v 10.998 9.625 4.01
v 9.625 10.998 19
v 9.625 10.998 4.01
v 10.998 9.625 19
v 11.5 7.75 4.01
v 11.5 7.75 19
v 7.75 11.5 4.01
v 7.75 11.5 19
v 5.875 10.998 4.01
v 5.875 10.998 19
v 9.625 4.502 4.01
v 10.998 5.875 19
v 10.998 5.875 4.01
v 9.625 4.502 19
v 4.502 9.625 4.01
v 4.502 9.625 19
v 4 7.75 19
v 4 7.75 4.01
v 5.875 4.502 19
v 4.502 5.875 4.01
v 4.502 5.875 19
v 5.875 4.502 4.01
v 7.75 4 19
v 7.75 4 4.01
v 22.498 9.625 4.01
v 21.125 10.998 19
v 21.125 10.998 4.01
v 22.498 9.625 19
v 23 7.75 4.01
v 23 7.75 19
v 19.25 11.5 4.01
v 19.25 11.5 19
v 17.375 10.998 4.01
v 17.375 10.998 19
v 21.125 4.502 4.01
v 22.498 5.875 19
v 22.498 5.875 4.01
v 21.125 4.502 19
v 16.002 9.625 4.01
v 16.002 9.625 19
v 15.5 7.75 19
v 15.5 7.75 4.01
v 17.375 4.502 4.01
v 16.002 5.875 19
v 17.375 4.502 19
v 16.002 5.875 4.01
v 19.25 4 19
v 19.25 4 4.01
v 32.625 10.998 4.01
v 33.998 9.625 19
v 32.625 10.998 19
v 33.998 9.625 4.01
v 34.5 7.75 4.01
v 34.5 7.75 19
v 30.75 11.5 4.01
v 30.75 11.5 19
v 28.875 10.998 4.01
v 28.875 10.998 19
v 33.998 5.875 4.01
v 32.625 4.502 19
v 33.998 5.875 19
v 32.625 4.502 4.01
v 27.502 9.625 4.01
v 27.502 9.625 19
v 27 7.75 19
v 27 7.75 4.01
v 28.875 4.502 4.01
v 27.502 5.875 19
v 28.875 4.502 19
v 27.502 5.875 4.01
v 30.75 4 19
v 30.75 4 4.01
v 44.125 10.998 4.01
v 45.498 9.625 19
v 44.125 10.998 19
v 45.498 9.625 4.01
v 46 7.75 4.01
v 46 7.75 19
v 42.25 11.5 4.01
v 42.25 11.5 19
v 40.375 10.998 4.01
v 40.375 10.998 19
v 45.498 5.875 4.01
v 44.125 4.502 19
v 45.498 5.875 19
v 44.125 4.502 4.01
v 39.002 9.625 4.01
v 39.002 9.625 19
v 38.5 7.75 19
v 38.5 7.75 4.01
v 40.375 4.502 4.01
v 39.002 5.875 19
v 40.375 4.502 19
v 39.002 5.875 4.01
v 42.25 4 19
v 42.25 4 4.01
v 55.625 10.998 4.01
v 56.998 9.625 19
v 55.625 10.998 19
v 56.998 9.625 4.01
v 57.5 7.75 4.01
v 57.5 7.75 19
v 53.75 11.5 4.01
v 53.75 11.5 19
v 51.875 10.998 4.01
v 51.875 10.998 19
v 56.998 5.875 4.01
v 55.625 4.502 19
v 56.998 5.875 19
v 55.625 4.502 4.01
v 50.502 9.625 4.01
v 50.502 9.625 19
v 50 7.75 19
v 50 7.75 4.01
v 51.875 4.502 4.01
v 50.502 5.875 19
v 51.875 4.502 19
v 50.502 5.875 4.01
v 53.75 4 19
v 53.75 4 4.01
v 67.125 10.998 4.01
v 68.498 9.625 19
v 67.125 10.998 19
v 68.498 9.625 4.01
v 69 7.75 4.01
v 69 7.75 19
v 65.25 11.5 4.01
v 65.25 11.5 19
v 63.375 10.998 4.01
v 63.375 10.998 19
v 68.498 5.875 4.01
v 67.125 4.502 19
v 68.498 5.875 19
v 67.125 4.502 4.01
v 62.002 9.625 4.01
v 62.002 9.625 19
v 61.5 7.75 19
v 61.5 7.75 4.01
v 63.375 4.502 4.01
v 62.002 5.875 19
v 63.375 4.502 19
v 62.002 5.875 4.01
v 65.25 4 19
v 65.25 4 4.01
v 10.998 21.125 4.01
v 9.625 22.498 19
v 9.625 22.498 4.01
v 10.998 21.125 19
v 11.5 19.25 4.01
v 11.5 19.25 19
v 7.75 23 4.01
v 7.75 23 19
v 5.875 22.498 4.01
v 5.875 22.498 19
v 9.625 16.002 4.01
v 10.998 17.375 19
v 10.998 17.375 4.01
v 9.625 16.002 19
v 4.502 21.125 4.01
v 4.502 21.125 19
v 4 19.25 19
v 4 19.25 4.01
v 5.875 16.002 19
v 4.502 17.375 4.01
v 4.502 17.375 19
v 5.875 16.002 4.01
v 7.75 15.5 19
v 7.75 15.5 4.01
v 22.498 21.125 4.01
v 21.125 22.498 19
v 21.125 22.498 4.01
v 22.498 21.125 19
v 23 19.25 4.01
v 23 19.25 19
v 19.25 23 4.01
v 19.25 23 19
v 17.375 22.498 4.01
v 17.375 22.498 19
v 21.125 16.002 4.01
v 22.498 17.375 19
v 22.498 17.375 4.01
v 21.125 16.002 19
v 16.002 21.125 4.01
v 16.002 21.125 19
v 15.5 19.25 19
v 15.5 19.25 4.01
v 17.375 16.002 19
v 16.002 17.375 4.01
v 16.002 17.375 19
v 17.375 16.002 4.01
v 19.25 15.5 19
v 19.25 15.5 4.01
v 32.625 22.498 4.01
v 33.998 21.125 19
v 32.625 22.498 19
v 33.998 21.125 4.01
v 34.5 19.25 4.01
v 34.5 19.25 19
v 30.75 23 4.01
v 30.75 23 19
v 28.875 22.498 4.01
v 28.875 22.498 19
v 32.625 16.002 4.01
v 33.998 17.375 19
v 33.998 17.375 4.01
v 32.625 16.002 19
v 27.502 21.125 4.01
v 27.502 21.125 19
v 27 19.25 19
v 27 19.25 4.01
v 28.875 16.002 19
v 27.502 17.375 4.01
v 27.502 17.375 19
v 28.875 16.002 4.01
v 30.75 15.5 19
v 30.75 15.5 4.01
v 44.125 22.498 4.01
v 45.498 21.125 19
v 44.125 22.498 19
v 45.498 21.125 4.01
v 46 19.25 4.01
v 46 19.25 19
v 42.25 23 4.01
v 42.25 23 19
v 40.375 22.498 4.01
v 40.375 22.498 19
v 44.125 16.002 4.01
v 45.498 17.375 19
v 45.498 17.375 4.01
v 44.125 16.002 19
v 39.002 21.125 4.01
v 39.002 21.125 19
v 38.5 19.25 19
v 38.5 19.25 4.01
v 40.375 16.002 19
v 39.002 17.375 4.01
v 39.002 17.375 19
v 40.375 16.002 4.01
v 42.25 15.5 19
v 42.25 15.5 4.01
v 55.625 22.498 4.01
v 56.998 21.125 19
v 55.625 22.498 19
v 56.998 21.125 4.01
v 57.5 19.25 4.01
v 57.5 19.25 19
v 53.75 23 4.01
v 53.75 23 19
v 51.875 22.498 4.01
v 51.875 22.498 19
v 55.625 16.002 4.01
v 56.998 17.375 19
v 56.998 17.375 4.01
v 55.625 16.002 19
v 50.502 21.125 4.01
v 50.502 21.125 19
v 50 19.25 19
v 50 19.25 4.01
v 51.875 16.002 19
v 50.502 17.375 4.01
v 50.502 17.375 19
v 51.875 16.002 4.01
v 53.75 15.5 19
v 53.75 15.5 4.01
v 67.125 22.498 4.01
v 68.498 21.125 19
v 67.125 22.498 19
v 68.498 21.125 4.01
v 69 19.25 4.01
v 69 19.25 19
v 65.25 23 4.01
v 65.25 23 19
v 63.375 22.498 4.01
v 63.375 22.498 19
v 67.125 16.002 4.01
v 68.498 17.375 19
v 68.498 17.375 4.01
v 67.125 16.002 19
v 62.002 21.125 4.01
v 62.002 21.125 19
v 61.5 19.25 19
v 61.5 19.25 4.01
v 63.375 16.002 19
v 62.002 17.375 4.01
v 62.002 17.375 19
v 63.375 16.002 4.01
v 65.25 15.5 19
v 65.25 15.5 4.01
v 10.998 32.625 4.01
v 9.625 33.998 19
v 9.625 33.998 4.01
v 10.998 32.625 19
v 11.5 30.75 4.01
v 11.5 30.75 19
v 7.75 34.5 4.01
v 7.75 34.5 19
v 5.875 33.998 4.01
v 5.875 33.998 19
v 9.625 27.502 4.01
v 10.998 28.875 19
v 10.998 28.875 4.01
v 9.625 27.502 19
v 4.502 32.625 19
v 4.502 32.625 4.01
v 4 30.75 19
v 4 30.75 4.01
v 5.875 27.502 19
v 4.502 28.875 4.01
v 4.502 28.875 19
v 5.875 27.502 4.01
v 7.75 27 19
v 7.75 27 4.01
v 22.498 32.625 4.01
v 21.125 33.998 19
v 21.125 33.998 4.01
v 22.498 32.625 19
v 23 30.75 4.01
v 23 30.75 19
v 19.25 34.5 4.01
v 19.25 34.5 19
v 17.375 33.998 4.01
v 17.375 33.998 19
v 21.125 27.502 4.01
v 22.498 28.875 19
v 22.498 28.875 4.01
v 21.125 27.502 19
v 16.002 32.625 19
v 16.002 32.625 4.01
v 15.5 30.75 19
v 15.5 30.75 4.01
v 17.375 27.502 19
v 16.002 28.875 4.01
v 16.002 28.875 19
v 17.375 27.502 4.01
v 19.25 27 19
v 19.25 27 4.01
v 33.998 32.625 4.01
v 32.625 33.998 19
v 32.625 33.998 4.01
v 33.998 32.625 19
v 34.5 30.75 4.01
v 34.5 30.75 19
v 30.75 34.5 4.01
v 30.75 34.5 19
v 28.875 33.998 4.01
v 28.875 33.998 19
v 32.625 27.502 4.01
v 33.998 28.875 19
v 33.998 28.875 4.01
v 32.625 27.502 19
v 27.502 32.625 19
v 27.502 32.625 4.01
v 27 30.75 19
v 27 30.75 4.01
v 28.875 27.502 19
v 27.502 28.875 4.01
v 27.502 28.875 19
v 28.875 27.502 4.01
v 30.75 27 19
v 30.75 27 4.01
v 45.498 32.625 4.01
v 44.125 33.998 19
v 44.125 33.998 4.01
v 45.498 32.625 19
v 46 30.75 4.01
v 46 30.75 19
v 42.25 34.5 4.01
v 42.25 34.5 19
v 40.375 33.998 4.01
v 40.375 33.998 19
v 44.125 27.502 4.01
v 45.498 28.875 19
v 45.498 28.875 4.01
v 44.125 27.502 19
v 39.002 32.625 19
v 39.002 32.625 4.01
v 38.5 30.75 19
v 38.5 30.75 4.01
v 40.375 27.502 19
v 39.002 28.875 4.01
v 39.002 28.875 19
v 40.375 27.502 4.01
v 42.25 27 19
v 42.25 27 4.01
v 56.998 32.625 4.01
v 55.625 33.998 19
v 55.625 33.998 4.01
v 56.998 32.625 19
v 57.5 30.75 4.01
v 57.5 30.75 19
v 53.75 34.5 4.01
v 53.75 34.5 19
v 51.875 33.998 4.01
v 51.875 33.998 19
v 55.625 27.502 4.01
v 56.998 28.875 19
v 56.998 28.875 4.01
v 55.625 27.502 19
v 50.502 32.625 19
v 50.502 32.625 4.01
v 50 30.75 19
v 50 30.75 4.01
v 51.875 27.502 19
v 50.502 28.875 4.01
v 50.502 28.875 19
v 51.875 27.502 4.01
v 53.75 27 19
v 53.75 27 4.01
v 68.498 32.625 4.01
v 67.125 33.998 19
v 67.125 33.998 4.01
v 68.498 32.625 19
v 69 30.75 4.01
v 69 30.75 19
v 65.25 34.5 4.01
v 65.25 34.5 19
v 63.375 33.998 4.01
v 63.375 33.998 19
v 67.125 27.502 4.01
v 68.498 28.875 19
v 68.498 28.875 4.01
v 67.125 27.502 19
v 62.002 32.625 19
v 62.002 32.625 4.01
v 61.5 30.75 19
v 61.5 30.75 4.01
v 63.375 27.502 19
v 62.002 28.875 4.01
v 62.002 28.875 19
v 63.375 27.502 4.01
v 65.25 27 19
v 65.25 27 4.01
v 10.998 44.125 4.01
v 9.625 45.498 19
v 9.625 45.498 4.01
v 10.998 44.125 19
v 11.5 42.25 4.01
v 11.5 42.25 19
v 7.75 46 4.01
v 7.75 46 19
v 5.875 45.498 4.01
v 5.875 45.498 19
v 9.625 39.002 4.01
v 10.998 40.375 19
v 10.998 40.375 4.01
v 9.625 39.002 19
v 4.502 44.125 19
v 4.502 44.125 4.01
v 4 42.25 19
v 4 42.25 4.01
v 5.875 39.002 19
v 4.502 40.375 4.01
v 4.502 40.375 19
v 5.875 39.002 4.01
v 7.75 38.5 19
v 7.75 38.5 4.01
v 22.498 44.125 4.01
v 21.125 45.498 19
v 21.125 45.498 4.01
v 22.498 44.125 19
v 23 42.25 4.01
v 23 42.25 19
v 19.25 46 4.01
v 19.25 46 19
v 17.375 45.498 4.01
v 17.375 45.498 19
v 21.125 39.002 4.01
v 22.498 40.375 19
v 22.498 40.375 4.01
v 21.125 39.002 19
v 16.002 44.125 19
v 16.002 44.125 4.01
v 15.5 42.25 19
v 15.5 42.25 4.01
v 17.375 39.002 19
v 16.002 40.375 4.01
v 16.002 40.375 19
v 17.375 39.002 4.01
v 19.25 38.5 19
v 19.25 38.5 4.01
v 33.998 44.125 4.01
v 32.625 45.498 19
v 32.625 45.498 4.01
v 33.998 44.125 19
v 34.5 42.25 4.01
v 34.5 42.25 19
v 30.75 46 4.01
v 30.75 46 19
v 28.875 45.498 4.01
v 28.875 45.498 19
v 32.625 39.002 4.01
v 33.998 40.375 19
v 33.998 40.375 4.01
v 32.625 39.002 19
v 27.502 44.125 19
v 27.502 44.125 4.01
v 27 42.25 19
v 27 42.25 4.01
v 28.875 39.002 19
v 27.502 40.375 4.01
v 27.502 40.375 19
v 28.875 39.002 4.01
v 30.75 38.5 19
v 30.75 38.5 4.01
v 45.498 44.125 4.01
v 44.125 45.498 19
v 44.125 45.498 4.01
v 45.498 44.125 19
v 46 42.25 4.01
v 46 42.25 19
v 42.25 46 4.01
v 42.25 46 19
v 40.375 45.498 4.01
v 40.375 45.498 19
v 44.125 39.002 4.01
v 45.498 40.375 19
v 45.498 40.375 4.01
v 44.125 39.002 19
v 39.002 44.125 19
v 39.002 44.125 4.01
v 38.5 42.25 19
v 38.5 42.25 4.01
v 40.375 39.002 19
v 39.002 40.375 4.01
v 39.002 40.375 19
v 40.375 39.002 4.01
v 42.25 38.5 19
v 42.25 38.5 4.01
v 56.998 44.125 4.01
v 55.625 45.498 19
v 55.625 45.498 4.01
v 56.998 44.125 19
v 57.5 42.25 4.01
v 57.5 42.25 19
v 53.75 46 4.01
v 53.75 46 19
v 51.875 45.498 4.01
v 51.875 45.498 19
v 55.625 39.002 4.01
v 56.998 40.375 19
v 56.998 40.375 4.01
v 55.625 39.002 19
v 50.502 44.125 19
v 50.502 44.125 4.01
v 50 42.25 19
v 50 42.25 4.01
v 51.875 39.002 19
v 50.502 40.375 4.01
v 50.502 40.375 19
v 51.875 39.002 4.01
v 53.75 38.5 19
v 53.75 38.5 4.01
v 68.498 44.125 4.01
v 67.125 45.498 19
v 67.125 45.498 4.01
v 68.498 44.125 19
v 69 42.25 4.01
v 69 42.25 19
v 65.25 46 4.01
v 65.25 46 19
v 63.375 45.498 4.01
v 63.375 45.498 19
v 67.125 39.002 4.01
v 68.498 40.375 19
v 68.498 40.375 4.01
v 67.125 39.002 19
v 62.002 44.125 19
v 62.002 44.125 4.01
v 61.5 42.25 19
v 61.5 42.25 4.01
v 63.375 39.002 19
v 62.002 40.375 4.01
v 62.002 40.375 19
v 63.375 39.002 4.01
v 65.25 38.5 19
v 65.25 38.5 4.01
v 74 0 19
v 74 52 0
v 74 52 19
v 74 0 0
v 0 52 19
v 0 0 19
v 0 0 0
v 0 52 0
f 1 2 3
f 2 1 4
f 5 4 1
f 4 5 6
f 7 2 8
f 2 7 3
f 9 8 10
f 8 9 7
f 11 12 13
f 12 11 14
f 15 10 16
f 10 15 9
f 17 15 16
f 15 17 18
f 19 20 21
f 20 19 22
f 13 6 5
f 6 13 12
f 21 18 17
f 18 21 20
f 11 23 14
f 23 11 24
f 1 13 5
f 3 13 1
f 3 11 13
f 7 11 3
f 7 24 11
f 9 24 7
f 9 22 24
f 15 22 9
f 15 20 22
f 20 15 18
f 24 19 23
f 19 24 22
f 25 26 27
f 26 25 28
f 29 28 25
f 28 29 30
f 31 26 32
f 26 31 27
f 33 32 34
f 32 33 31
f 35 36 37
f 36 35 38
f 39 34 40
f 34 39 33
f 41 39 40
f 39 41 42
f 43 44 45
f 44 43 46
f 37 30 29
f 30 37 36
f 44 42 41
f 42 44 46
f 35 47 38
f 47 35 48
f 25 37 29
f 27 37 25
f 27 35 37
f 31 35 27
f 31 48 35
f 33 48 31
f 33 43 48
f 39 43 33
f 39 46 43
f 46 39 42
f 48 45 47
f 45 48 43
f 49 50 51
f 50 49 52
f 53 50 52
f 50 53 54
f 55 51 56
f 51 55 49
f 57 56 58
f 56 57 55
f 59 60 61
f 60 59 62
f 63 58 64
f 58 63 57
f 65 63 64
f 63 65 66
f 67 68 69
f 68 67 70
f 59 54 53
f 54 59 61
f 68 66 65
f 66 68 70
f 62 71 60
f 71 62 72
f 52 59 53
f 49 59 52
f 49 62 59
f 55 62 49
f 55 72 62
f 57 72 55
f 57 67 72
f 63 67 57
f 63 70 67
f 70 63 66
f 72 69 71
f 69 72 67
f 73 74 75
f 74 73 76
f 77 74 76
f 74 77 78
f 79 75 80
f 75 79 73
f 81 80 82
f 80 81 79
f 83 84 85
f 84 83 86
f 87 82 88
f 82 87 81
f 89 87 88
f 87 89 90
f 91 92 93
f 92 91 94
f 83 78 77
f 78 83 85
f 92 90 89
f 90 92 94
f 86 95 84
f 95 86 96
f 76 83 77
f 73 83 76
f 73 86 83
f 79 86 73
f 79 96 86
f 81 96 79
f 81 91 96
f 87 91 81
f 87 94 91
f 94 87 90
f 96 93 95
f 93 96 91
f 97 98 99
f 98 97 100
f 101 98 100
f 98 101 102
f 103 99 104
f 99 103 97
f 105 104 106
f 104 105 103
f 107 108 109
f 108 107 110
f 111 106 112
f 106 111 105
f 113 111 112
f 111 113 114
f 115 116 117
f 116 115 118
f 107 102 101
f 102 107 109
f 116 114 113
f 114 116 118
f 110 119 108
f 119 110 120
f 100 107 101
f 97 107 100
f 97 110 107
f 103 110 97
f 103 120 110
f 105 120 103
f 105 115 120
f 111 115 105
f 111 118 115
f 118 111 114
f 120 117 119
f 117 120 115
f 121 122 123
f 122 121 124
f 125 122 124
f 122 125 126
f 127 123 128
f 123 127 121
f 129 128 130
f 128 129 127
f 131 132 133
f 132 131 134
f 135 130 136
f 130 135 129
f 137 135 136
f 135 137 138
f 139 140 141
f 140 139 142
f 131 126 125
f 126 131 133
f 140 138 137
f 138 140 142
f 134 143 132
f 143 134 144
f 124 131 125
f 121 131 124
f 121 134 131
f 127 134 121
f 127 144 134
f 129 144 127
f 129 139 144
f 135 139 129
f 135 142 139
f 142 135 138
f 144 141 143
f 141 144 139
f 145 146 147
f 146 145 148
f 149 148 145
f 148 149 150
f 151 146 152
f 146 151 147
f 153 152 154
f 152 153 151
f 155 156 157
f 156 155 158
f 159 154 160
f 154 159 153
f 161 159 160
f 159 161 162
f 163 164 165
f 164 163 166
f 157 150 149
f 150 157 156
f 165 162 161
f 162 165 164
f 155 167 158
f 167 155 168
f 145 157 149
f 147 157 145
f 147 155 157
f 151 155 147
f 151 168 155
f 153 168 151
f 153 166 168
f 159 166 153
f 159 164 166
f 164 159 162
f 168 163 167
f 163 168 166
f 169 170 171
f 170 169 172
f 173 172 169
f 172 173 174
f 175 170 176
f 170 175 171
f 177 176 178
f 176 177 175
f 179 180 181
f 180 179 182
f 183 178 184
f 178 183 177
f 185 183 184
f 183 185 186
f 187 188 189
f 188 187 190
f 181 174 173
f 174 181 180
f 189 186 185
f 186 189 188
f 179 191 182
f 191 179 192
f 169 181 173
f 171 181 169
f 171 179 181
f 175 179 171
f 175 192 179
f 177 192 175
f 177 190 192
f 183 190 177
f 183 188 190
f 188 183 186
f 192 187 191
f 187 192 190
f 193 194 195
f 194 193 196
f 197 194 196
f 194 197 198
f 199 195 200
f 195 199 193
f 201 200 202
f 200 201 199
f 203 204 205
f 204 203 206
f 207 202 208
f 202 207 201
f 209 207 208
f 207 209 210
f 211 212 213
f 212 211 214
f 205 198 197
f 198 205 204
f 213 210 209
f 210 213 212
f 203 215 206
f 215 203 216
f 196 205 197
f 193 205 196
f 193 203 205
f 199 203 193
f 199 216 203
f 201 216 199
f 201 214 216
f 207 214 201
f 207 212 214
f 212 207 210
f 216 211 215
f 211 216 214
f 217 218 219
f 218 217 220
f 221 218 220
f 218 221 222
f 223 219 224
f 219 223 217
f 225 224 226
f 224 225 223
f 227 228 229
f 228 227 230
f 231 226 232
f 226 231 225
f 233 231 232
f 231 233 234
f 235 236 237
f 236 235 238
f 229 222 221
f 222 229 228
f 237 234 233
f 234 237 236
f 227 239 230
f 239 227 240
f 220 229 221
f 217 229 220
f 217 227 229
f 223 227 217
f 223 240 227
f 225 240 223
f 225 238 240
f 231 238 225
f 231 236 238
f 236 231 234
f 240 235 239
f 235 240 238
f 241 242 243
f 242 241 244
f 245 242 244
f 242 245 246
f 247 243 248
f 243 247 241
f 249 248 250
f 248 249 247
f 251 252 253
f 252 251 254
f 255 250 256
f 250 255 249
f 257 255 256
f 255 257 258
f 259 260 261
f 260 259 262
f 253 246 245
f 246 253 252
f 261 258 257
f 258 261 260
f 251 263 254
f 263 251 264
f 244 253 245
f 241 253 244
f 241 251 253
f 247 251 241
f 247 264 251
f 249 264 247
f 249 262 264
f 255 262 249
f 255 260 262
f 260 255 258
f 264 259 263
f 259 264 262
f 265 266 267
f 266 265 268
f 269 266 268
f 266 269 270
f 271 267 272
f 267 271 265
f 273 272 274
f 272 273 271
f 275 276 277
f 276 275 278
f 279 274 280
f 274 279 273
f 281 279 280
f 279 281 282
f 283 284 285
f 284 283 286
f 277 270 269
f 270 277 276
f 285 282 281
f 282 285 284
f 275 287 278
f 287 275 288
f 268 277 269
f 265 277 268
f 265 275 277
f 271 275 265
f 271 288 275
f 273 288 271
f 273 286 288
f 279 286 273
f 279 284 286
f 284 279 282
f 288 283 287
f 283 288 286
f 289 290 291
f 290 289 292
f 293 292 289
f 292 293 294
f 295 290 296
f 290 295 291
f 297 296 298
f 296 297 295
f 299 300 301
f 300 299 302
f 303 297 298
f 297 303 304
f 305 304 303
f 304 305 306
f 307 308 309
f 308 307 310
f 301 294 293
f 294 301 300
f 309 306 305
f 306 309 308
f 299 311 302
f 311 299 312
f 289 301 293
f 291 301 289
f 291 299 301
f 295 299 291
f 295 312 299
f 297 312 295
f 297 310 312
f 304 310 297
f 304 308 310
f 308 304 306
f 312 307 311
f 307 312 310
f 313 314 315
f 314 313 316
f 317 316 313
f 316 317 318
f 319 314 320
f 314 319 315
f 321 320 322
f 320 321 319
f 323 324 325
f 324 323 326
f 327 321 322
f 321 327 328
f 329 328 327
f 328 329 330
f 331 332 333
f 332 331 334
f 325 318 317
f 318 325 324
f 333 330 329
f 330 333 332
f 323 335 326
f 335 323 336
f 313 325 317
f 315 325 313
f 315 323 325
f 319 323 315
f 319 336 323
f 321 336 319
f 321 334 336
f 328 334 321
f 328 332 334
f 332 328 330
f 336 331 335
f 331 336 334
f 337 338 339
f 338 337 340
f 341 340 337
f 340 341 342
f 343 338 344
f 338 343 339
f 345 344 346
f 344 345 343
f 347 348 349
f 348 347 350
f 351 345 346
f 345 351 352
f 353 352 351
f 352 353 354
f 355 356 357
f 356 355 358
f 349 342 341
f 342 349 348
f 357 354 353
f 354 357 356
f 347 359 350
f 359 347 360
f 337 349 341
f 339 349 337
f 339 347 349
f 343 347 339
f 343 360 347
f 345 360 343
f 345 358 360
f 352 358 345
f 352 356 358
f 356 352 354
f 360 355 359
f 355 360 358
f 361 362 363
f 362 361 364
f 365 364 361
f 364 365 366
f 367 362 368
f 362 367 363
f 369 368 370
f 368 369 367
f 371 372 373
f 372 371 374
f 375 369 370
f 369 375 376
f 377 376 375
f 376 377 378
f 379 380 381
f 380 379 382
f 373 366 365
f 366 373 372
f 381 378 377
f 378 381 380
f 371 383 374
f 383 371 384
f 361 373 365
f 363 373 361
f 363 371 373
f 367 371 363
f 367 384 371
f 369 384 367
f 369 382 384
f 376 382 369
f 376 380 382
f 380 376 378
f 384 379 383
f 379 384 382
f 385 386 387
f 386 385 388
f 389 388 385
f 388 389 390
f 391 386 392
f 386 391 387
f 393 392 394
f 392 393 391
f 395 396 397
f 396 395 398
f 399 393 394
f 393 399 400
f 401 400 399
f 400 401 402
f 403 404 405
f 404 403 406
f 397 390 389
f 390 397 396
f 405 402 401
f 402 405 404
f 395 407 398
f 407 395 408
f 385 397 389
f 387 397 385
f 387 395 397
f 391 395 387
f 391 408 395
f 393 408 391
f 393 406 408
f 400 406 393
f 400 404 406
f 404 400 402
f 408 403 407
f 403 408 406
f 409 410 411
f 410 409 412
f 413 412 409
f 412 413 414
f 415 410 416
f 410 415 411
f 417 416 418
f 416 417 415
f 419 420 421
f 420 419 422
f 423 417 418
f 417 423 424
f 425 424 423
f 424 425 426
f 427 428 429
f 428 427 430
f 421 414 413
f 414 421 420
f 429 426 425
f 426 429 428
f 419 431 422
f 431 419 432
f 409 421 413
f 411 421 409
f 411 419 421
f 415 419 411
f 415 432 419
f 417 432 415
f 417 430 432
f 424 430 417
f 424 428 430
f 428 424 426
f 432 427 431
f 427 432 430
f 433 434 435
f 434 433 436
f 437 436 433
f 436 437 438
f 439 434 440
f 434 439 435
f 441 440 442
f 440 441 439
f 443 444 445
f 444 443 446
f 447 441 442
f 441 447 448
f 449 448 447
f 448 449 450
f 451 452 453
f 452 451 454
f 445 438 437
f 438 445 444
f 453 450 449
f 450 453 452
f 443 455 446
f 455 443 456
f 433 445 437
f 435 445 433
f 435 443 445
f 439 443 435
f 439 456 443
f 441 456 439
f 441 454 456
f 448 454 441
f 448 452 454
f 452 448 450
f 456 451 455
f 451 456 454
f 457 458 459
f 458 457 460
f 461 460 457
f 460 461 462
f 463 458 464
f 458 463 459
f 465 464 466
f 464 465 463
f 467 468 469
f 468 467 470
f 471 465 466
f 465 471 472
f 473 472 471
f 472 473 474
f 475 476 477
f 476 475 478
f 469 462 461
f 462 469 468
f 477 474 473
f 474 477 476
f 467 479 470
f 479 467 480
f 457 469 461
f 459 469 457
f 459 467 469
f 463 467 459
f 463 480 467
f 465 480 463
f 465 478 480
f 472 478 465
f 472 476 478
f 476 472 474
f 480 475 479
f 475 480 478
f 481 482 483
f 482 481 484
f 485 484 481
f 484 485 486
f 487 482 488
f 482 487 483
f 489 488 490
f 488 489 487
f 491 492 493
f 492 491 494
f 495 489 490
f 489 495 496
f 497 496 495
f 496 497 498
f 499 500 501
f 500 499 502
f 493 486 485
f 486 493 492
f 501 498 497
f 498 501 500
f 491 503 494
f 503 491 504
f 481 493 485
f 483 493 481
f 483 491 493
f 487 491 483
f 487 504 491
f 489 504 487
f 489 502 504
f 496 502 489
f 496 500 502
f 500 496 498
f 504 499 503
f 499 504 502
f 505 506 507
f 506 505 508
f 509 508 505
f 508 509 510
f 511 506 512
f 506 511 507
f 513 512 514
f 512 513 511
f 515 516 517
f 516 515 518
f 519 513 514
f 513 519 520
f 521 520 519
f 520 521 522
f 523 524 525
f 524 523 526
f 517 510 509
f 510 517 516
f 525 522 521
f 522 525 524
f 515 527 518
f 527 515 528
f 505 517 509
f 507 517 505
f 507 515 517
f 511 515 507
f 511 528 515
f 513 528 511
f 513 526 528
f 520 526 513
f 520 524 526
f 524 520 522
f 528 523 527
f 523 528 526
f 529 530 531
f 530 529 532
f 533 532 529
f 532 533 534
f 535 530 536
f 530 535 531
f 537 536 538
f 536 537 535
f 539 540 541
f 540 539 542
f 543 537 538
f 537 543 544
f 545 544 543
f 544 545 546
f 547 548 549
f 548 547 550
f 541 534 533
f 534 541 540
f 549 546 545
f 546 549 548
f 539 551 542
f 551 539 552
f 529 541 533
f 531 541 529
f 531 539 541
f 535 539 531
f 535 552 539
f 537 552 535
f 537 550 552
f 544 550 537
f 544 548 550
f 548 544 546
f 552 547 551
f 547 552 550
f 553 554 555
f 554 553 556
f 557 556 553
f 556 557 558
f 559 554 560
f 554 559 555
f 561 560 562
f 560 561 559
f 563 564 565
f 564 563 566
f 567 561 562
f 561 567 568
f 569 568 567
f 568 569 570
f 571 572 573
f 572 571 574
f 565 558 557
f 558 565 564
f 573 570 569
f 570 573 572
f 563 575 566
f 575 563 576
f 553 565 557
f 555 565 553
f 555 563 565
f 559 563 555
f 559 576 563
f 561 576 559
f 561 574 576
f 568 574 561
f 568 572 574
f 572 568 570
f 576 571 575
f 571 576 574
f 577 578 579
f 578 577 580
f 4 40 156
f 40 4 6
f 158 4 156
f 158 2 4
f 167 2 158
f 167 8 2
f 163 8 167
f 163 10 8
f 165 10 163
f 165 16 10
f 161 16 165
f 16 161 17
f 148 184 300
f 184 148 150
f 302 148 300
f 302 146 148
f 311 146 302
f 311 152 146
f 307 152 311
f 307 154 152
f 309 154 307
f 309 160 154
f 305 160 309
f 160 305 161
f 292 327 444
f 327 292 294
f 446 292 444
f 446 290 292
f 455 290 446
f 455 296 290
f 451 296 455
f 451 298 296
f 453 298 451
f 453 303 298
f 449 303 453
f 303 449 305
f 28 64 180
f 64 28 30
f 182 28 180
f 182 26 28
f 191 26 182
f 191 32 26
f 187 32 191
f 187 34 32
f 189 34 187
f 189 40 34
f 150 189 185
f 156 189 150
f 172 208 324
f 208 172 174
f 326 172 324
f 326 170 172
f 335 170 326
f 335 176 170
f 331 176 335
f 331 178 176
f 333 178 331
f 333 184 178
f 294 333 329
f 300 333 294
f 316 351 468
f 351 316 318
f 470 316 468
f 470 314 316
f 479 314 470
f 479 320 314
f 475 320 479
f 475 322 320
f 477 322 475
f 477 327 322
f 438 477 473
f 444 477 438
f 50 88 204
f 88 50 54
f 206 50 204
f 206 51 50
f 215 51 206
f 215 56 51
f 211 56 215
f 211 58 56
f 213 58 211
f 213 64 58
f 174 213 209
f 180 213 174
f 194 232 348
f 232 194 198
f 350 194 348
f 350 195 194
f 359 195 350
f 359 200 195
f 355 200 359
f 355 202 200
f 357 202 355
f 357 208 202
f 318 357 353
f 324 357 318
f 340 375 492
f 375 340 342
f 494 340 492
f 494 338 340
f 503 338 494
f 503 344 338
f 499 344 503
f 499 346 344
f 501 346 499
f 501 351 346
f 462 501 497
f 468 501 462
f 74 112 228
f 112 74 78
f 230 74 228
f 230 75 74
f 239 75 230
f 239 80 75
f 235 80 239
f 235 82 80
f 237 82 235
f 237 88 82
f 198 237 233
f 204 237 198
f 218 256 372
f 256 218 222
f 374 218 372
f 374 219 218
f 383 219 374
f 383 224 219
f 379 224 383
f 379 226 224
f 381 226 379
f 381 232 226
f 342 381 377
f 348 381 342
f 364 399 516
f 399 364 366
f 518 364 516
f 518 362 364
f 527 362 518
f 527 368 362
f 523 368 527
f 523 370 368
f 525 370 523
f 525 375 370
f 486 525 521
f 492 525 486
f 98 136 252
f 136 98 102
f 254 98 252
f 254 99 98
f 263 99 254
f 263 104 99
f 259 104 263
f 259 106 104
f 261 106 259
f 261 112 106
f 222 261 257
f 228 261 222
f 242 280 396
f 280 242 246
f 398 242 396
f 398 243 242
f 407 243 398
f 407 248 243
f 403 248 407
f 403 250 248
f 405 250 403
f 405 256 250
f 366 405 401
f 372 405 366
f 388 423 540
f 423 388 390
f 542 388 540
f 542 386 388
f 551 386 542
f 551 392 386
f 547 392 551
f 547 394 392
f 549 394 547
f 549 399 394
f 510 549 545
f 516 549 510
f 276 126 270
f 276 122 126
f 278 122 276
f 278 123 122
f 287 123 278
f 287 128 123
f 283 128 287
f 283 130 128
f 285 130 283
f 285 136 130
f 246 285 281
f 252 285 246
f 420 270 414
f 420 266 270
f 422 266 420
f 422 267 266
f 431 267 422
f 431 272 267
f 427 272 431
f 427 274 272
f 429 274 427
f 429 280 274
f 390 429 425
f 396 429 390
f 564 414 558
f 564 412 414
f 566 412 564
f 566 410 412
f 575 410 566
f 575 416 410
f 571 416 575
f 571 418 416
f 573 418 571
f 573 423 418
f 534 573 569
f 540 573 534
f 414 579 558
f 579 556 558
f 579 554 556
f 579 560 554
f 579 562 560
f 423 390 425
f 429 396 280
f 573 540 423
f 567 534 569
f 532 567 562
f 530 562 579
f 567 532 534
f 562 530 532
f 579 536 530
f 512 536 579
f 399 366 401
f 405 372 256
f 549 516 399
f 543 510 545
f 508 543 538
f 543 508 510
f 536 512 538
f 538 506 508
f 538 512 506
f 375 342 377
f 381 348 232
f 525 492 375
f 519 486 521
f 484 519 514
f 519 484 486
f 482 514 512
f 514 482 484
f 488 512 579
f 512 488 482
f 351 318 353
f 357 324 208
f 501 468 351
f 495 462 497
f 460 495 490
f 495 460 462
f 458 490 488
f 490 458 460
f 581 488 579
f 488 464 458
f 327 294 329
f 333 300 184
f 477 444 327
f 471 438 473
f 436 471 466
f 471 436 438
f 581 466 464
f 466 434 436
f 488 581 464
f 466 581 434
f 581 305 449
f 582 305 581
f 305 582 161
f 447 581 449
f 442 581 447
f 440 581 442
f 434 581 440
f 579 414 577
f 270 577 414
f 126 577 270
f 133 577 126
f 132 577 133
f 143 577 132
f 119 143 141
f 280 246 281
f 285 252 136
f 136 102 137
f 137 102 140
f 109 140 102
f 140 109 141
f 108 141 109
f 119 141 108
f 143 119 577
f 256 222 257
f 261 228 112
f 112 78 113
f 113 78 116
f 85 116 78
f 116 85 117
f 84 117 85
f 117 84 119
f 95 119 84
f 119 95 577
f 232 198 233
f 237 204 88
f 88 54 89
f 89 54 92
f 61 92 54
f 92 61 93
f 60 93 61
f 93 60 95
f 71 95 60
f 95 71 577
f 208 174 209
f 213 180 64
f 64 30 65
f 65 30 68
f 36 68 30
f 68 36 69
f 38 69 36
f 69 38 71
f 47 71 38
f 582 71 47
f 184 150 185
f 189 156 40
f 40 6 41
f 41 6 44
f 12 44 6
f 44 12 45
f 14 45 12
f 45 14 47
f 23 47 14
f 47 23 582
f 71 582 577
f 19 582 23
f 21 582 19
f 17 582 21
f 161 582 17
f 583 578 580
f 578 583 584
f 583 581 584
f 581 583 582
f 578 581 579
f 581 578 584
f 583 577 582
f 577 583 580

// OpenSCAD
// file: ../common/library_line.scad
// 라이브러리, 검증된 것만 이곳에
include	<constants.scad>

module line_type_1(start, end, r1, r2) {
	r22 = is_undef(r2) ? r1 : r2;
    hull() {
        translate(start) sphere(r1, $fn = FN);
        translate(end) sphere(r22, $fn = FN);
    }

	dx = end.x - start.x;
	dy = end.y - start.y;
	dz = end.z - start.z;
	rx = dy == 0 ? 0 : atan(dz / dy);
	ry = dz == 0 ? 0 : 90 + atan(dx / dz);
	rz = dx == 0 ? 0 : atan(dy / dx);
	d = sqrt(dx * dx + dy * dy + dz * dz);
	fs = max(0.5, min(d / 32, 20));
	translate([(start.x + end.x) / 2 + max(r1, r22), (start.y + end.y) / 2 + max(r1, r22), (start.z + end.z) / 2 + max(r1, r22)])
		rotate([rx, ry, rz])
		linear_extrude(EPSILON, center = true)	text(str(d, " mm"), size = fs, halign = "center", language = "kr", font = "NanumGothic");
}
// file: ../common/utils.scad
// 유용한 것들, 검증된 것만
use <MCAD/boxes.scad>
include	<constants.scad>
include	<library.scad>

// 가장 긴 족의 2.1배
function big(v) = [
	max(v.x, v.y, v.z) * 2.1,
	max(v.x, v.y, v.z) * 2.1,
	max(v.x, v.y, v.z) * 2.1
];

// 임시
module	roundedBoxNotCenter(size = [32, 64, 8], radius = 8, sidesonly = true) {
	translate([size[0] / 2, size[1] / 2, size[2] / 2])		roundedBox(size, radius, sidesonly, $fn = FN);
}

// 라이브러리 아닌가
module windows(x, y, z, dx = 4, dy = 4, countx = 2, county = 2) {
//	echo(x, y, z, dx, dy, countx, county);
	w = (x + dx) / countx;
	h = (y + dy) / county;
	for (cw = [0:w:x - dx]) {
		for (ch = [0:h:y - dy]) {
			translate([cw, ch, -1])
				roundedBoxNotCenter([w - dx, h - z, z * 4], z / 2, true, $fn = FN);
		}
	}
}

// 벡터 회전 계산
function rotate_vector(angle, vector) = rotatez_vector(angle[2], rotatey_vector(angle[1], rotatex_vector(angle[0], vector)));
// x축 기준 회전 벡터 회전 계산
function rotatex_vector(anglex, vector) = [
	vector[0],
	-vector[2] * sin(anglex) + vector[1] * cos(anglex),
	vector[2] * cos(anglex) + vector[1] * sin(anglex)
];
// y축 기준 회전 벡터 회전 계산
function rotatey_vector(angley, vector) = [
	vector[0] * cos(angley) + vector[2] * sin(angley),
	vector[1],
	-vector[0] * sin(angley) + vector[2] * cos(angley)
];

// z축 기준 회전 벡터 회전 계산
function rotatez_vector(anglez, vector) = [
	-vector[1] * sin(anglez) + vector[0] * cos(anglez),
	vector[1] * cos(anglez) + vector[0] * sin(anglez),
	vector[2]
];

//	끝이 구인 선
module line_sphere(start, end, thickness = 1) {
    hull() {
        translate(start) sphere(thickness, $fn = FN);
        translate(end) sphere(thickness, $fn = FN);
    }
}

// 치수 표시, 라이브러리가 더 적합할 듯
// deprecated. use note_type_1 in library
module note(x, y, z, centered = false, fs, detail = false) {
	note_type_1([x, y, z], [x, y, z], centered, fs, detail);
	echo("WARNING! module note in utils.scad was DEPRECATED. USE note_type_1 in library. called by ", parent_module(1), $parent_modules);
}
module boardPattern(size = [128, 64, 4], degree = 60, stick = [THICK, THICK, 32]) {
	intersection() {
		cube([size[0], size[1], stick[1]]);
		for (dx = [-1024: stick[2]: 1024]) {
			translate([dx, -cos(degree) * stick[1], -1])	rotate([0, 0, degree])	cube([1024, stick[0], stick[1]]);
			mirror([1, 0, 0])
			translate([dx, -cos(degree) * stick[1], -1])	rotate([0, 0, degree])	cube([1024, stick[0], stick[1]]);
		}
	}
}


module samples() {
	cube([32, 16, 4]);
	note(32, 16, 4);
}
samples();
// file: ../common/library_function.scad
// 라이브러리, 검증된 것만 이곳에
use <MCAD/boxes.scad>
include	<constants.scad>

// 적정한 fn 값
function fnRound(radious) = $preview ? FN : floor(2 * PI * radious / 0.4) - floor(2 * PI * radious / 0.4) % 4;
//function fnRound(radious) = 2 * PI * radious / 0.4;

// z축 0로로
function set_z(v, z) = [v.x, v.y, z];

// 벡터 회전 계산
function rotate_vector(angle, vector) = rotatez_vector(angle[2], rotatey_vector(angle[1], rotatex_vector(angle[0], vector)));
// x축 기준 회전 벡터 회전 계산
function rotatex_vector(anglex, vector) = [
	vector[0],
	-vector[2] * sin(anglex) + vector[1] * cos(anglex),
	vector[2] * cos(anglex) + vector[1] * sin(anglex)
];
// y축 기준 회전 벡터 회전 계산
function rotatey_vector(angley, vector) = [
	vector[0] * cos(angley) + vector[2] * sin(angley),
	vector[1],
	-vector[0] * sin(angley) + vector[2] * cos(angley)
];

// z축 기준 회전 벡터 회전 계산
function rotatez_vector(anglez, vector) = [
	-vector[1] * sin(anglez) + vector[0] * cos(anglez),
	vector[1] * cos(anglez) + vector[0] * sin(anglez),
	vector[2]
];

//	숫자, 소수점 이하 몇자리
function strfix(number, count) =
	chr([for (cx = [0:
		len(search(".", str(number))) == 0
			? len(str(number)) - 1
			: (search(".", str(number))[0] + count) >= len(str(number))
				? len(str(number)) - 1
				: (search(".", str(number))[0] + count)
	]) ord(str(number)[cx])])
;

//	육면체에서 꼭지점들을 벡터로
function	vectors_from_cube(size) = [
	[0,			0,		0],
	[size.x,	0,		0],
	[size.x,	size.y,	0],
	[0,			size.y,	0],

	[0,			0,		size.z],
	[size.x,	0,		size.z],
	[size.x,	size.y,	size.z],
	[0,			size.y,	size.z]
];
// file: ../common/library_cube.scad
// 라이브러리, 검증된 것만 이곳에
include	<constants.scad>
use <library_function.scad>
use <library_text.scad>
use <library_line.scad>

//	튜브형태의 네모 박스, 사방 벽면만 있는 형태
//	size: 외경
module box_type_1(size, thick) {
	cube([size[0], thick, size[2]]);	//	앞
	translate([0, size[1] - thick, 0])	cube([size[0], thick, size[2]]);	//	뒤

	translate([0, 0, 0])	cube([thick, size[1], size[2]]);	//	왼쪽
	translate([size[0] - thick, 0, 0])	cube([thick, size[1], size[2]]);	//	오른쪽
}

module cube_type_0(size, center) {
	cube(size, center);
	note_type_2("", size, size, center);
}

// 끝에 반구가 더달린 실린더형태의 3차원 라인
// 대칭 사다리꼴, xz 평면에서 보았을 때
module cube_type_1(v, x) {
	rotate([0, -90, -90])
	linear_extrude(v.y)
	polygon([
		[0,		0],
		[0,		v.x],
		[v.z,	v.x - (v.x - x) / 2],
		[v.z,	(v.x - x) / 2],
		[0,		0]
	]);
}

// 한쪽으로만(x축 방향으로만) 늘어나는(또는 줄어드는) 사다리꼴-하나는 직각 유지, xz 평면에서 보았을 때
module cube_type_2(v, x) {
	rotate([0, -90, -90])
	linear_extrude(v.y)
	polygon([
		[0,		0],
		[0,		v.x],
		[v.z,	x],
		[v.z,	0],
		[0,		0]
	]);
	note_type_2("", v, [x, v.y, v.z]);
}

// 벡터들을 이용하여 꼭지점을 직각으로만 연결하는 육면체
module cube_type_3(vectors, radious) {
	// 아래쪽
	line_type_1(vectors[0], vectors[1], radious);
	line_type_1(vectors[1], vectors[2], radious);
	line_type_1(vectors[2], vectors[3], radious);
	line_type_1(vectors[3], vectors[0], radious);

	// 위쪽
	line_type_1(vectors[4], vectors[5], radious);
	line_type_1(vectors[5], vectors[6], radious);
	line_type_1(vectors[6], vectors[7], radious);
	line_type_1(vectors[7], vectors[4], radious);
	
	// 기둥
	line_type_1(vectors[0], vectors[4], radious);
	line_type_1(vectors[1], vectors[5], radious);
	line_type_1(vectors[2], vectors[6], radious);
	line_type_1(vectors[3], vectors[7], radious);
}

// x 축으로의 모서리의 일부 각(x축으로 평행한 모서리)을 제거한 것
module cube_type_4(v, c) {
	r = is_undef(c) ? min(v.x, v.y, v.z) / 16 : c;
	stiffen = r * sqrt(2);

	translate([0, r, 0])		cube(v - [0, r * 2, 0]);
	translate([0, 0, r])		cube(v - [0, 0, r * 2]);
	translate([0, r, 0])				rotate([45, 0, 0])	cube([v.x, stiffen, stiffen]);
	translate([0, r, v.z - r * 2])		rotate([45, 0, 0])	cube([v.x, stiffen, stiffen]);
	translate([0, v.y - r, v.z - r * 2])		rotate([45, 0, 0])	cube([v.x, stiffen, stiffen]);
	translate([0, v.y - r, 0])		rotate([45, 0, 0])	cube([v.x, stiffen, stiffen]);
}

// xy평면에 격자 모형, 45도
module cube_type_5(size, wall, distance) {
	w = is_undef(wall) ? size.z : wall;
	dx = is_undef(distance) ? w * 4 : distance;
	intersection() {
		cube(size);
		for(cx = [0: dx: size.x + size.y]) {
			translate([cx, - w * sqrt(2), 0])	rotate([0, 0, 45])	cube([w, size.y * 2, size.z]);
			translate([cx - size.y, - w * sqrt(2), 0])	rotate([0, 0, -45])	cube([w, size.y * 2, size.z]);
		}
	}
}

// xy평면에 격자 모형, 45도
module cube_type_5(size, wall, distance) {
	w = is_undef(wall) ? size.z : wall;
	dx = is_undef(distance) ? w * 4 : distance;
	intersection() {
		cube(size);
		for(cx = [0: dx: size.x + size.y]) {
			translate([cx, - w * sqrt(2), 0])	rotate([0, 0, 45])	cube([w, size.y * 2, size.z]);
			translate([cx - size.y, - w * sqrt(2), 0])	rotate([0, 0, -45])	cube([w, size.y * 2, size.z]);
		}
	}
}

// xy평면에 테두리만 있는, 바깥쪽만 모서리 둥근 처리된된
module cube_type_6(size, width, radious) {
	w = is_undef(width) ? size.z : width;
	r = is_undef(radious) ? 0 : radious;
	r2 = r * 2;
	
	translate([0, r, 0])			cube([w, size.y - r2, size.z]);
	translate([size.x - w, r, 0])	cube([w, size.y - r2, size.z]);
	translate([r, 0, 0])			cube([size.x - r2, w, size.z]);
	translate([r, size.y - w, 0])	cube([size.x - r2, w, size.z]);

	translate([r, r, 0])	cylinder(size.z, r, r, $fn = fnRound(size.z));
	translate([size.x - r, r, 0])	cylinder(size.z, r, r, $fn = fnRound(size.z));
	translate([r, size.y - r, 0])	cylinder(size.z, r, r, $fn = fnRound(size.z));
	translate([size.x - r, size.y - r, 0])	cylinder(size.z, r, r, $fn = fnRound(size.z));
}

// 모든 모서리를 45도 각도로 잘라낸 것
module cube_type_7(v, c) {
	r = is_undef(c) ? min(v.x, v.y, v.z) / 16 : c;
	stiffen = r * sqrt(2);

	difference() {
		cube(v);

		// 아래 앞쪽
		translate([0, 0, -r])
			rotate([45, 0, 0])
			cube([v.x, stiffen, stiffen]);
		// 앞쪽 위
		translate([0, 0, v.z - r])
			rotate([45, 0, 0])
			cube([v.x, stiffen, stiffen]);
		// 뒤쪽 위
		translate([0, v.y, v.z - r])
			rotate([45, 0, 0])
			cube([v.x, stiffen, stiffen]);
		// 뒤쪽 아래
		translate([0, v.y, -r])
			rotate([45, 0, 0])
			cube([v.x, stiffen, stiffen]);

		// 왼쪽 아래
		translate([-r, 0, 0])
			rotate([0, 45, 0])
			cube([stiffen, v.y, stiffen]);
		// 오른쪽 아래
		translate([v.x - r, 0, 0])
			rotate([0, 45, 0])
			cube([stiffen, v.y, stiffen]);
		// 오른쪽 위
		translate([v.x - r, 0, v.z])
			rotate([0, 45, 0])
			cube([stiffen, v.y, stiffen]);
		// 왼쪽 위
		translate([-r, 0, v.z])
			rotate([0, 45, 0])
			cube([stiffen, v.y, stiffen]);

		// 왼쪽 앞
		translate([0, -r, 0])
			rotate([0, 0, 45])
			cube([stiffen, stiffen, v.z]);
		// 오른쪽 앞
		translate([v.x, -r, 0])
			rotate([0, 0, 45])
			cube([stiffen, stiffen, v.z]);
		// 오른쪽 뒤
		translate([v.x, v.y - r, 0])
			rotate([0, 0, 45])
			cube([stiffen, stiffen, v.z]);
		// 왼쪽 뒤
		translate([0, v.y - r, 0])
			rotate([0, 0, 45])
			cube([stiffen, stiffen, v.z]);
	}
}

module cube_types() {
	//	cube_type_1
	color("white", 1.0)	cube_type_1([16, 32, 4], 12);
	note_type_2("cube_type_1", [16, 32, 4], [12, 32, 4]);
	x1 = 24;
	
	//	cube_type_2
	let (size = [8, 32, 4]) {
		translate([x1, 0, 0]) {
		//	color("yellow", 1.0)
			cube_type_2(size, 12);
//			note_type_2("cube_type_2", size, [12, 32, 4]);
		}
	}
	x2 = x1 + 24;

	//	box_type_1: 튜브형태의 네모 박스, 사방 벽면만 있는 형태
	translate([x2, 8, 0])
	{
		color("blue", 0.5)	box_type_1([8, 16, 32], 2);
		color("white", 0.5)	note_type_2("box_type_1", [8, 16, 32]);
	}
	x5 = x2 + 24;

	// cube_type_3: 벡터들을 이용하여 꼭지점을 직각으로만 연결하는 육면체
	translate([x5, 8, 8])
	{
		x = 4;
		y = 8;
		z = 16;
		r = 1;
		v = [
			[0, 0, 0],
			[x, 0, 0],
			[x, y, 0],
			[0, y, 0],
			[0, 0, z],
			[x, 0, z],
			[x, y, z],
			[0, y, z]
		];
		cube_type_3(v, r);
		color("white", 1.0)	
		translate([-r, -r, -r])	note_type_2("cube_type_3(v, 1)", [x, y, z] + [r * 2, r * 2, r * 2]);
	}
	x7 = x5 + 24;

	//	cube_type_1
	translate([x7, 0, 0])
	{
		color("white", 1.0)	cube_type_1([16, 32, 4], 12);
		//	module note_type_2(name, vs, ve, centered = false, fs, detail = false) {
		note_type_2("note_type_2", [16, 32, 4], [12, 32, 4], false, undef, true);
	}
	x12 = x7 + 24;

	//	cube_type_4
	translate([x12, 0, 0])
	{
		color("yellow", 1.0)	cube_type_4([16, 4, 8]);
		note_type_2("cube_type_4([16, 4, 8])", [16, 4, 8]);
	}
	x14 = x12 + 24;

	//	cube_type_5
	let (size = [16, 64, 2]) {
		translate([x14, 0, 0])
		{
			color("white", 1.0)
				cube_type_5(size, 2, 8);
			note_type_2(str("cube_type_5(", size, ", 2, 8)"), size);
		}
	}
	x15 = x14 + 24;

	//	cube_type_6
	let (size = [16, 32, 4]) {
		translate([x15, 0, 0])
		{
			color("yellow", 1.0)
				cube_type_6(size, 4, 2);
			note_type_2(str("cube_type_6(", size, ", 4, 2)"), size);
		}
	}
	x16 = x15 + 24;

	//	cube_type_7
	let (size = [32, 16, 8]) {
		translate([x16, 0, 0])
		{
			color("yellow", 1.0)
				cube_type_7(size, 1);
			note_type_2(str("cube_type_7(", size, ", 1)"), size);
		}
	}
	x17 = x16 + 24;
}
cube_types();
/*
# in HOME(project root, ie. .../resouce3d)
C:\apps\openscad-2021.01\openscad.exe -o C:\src\eclipse-workspace\resource3d\common\library_cube.stl --export-format asciistl C:\src\eclipse-workspace\resource3d\common\library_cube.scad
*/
// file: ../common/library.scad
// 라이브러리, 검증된 것만 이곳에
use <MCAD/boxes.scad>
include	<constants.scad>
use <library_function.scad>
use <library_text.scad>
use <library_cube.scad>
use <utils.scad>

/*
	모듈 섹션
*/
// 상하 모서리의 일부 각을 제거한 것
module cylinder_type_1(height, radious, cut) {
	fn = fnRound(radious);
	translate([0, 0, 0])			cylinder(cut,				radious - cut,	radious,		$fn = fn);
	translate([0, 0, cut])			cylinder(height - cut * 2,	radious,		radious,		$fn = fn);
	translate([0, 0, height - cut])	cylinder(cut,				radious,		radious - cut,	$fn = fn);
}

module line_type_1(start, end, r1, r2) {
	r22 = is_undef(r2) ? r1 : r2;
    hull() {
        translate(start) sphere(r1, $fn = FN);
        translate(end) sphere(r22, $fn = FN);
    }

	dx = end.x - start.x;
	dy = end.y - start.y;
	dz = end.z - start.z;
	rx = dy == 0 ? 0 : atan(dz / dy);
	ry = dz == 0 ? 0 : 90 + atan(dx / dz);
	rz = dx == 0 ? 0 : atan(dy / dx);
	d = sqrt(dx * dx + dy * dy + dz * dz);
	fs = max(0.5, min(d / 32, 20));
	%translate([(start.x + end.x) / 2 + max(r1, r22), (start.y + end.y) / 2 + max(r1, r22), (start.z + end.z) / 2 + max(r1, r22)])
		rotate([rx, ry, rz])
		linear_extrude(EPSILON, center = true)	text(str(d, " mm"), size = fs, halign = "center", language = "kr", font = "NanumGothic");
}

// 밑둥이 잘린 구
module sphere_type_1(r) {
	translate([r, r, r / 2])
	difference() {
		sphere(r, $fn = FN);
		translate([-r * 1.5, -r * 1.5, -r * 4 + r / 2])	cube(r * 3);
	}
}

/*
	홈파기, 트리머
*/
//	외경계산결과, r: 반지름, delta: 한쪽 여유
function trimmer_type_1_height(r, delta, y, z) =
	z	+ sqrt((r + delta) * (r + delta) - (r - delta) * (r - delta))
		+ sqrt((r + delta) * (r + delta) - ((r + delta) * sin(OVERHANG_THRESHOLD)) * ((r + delta) * sin(OVERHANG_THRESHOLD)))
		+ ((r + delta) * sin(OVERHANG_THRESHOLD)) * sin(OVERHANG_THRESHOLD)
;
module trimmer_type_1(r, delta, y, z) {
	r2 = r * 2;			//	지름
	delta2 = delta * 2;	//	양쪽 여유 합
	rplus = r + delta;
	rminus = r - delta;

	// 진입로
	cube_type_1([rplus * 2, y, z], rminus * 2);
	// 정착
	translate([rplus, 0, z + sqrt(rplus * rplus - rminus * rminus)])
		rotate([-90, 0, 0])
		cylinder(y, rplus, rplus, $fn = fnRound(rplus));
	// 오버행 제거
	let (
		x = rplus * sin(OVERHANG_THRESHOLD),
		z_start = z + sqrt(rplus * rplus - rminus * rminus) + sqrt(rplus * rplus - x * x),
	
		reserved = 0
	) {
		translate([rplus - x, 0, z_start])
			cube_type_1([x * 2, y, x * sin(OVERHANG_THRESHOLD)], 0);

		note_type_1([rplus * 2, y, z_start + x * sin(OVERHANG_THRESHOLD)]);
	}
}

module joint_female_type_1(radius, angles, radius1) {
	#sphere(radius);
	r1 = is_undef(radius1) ? radius / 4 : radius1;
	for (cx = [0:len(angles) - 1]) {
		distance = sqrt(angles[cx].x * angles[cx].x + angles[cx].y * angles[cx].y + angles[cx].z * angles[cx].z);
		start = [
			angles[cx].x / distance * r1 * 1.5,
			angles[cx].y / distance * r1 * 1.5,
			angles[cx].z / distance * r1 * 1.5
		];
		end = [
			angles[cx].x / distance * radius,
			angles[cx].y / distance * radius,
			angles[cx].z / distance * radius
		];
		line_type_1(start, end, r1);
	}
}


// 타원통
module ellipsis(x, y, z) {
	translate([x / 2, y / 2, 0])
		resize([x, y, z])
			cylinder(1, 1, 1, $fn = FN);
}

// 검은색 나사못을 박을 자리를 위한 주물, ref) https://github.com/andold/resource3d/blob/main/README.md
module casting_black_25(y, legend = false) {
	translate([0, 0, -8])
		cylinder(8, 7.9 / 2, 7.9 / 2, $fn = fnRound(4));
//	color("Lavender", 0.5)
	{
		cylinder(3, 7.9 / 2, 3.8 / 2, $fn = fnRound(4));
		translate([0, 0, 3])	cylinder(y, 3.8 / 2, 3.8 / 2, $fn = fnRound(2));
		translate([0, 0, 3 + y])	cylinder(25 - 3 - y, 3.4 / 2, 3.4 / 2, $fn = fnRound(2));
	}
	%if (legend) {
		translate([0, -5, -2])	rotate([90, 0, 0])	text("extra for space", 1, halign="center");
		translate([0, -5, 1])	rotate([90, 0, 0])	text("7.9 mm", 1, halign="center");
		translate([0, -3, 8])	rotate([90, 0, 0])	text("3.8 mm", 1, halign="center");
		translate([0, -3, 24])	rotate([90, 0, 0])	text("3.4 mm", 1, halign="center");

		translate([5, 4, 1])	rotate([90, 90, 0])	text("3.0 mm", 1, halign="center");
		translate([2, 2, 6])	rotate([90, 90, 0])	text(str(y, " mm"), 1, halign="center");
		translate([2, 1.5, 20])	rotate([90, 90, 0])	text(str(25 - 3 - y, " mm"), 1, halign="center");
	}
}

module samples() {
	//	cube_type_1
	color("white", 1.0)	cube_type_1([16, 32, 4], 12);
	note_type_1([16, 32, 4], [12, 32, 4]);
	translate([4, 24, 4])	text("cube_type_1", size = 1);
	translate([4, 22, 4])	text("[16, 32, 4], 12", size = 1);
	translate([4, 20, 4])	text("note_type_1", size = 1);
	x1 = 16 + 4;
	
	//	cube_type_2
	translate([x1, 0, 0]) {
		color("yellow", 1.0)	cube_type_2([16, 32, 4], 20);
		note_type_1([16, 32, 4], [12, 32, 4]);
		translate([4, 24, 4])	text("cube_type_2", size = 1);
		translate([4, 22, 4])	text("[16, 32, 4], 20", size = 1);
	}
	x2 = x1 + 16 + 4;

	//	sphere_type_1
	color("green", 1.0)	
	translate([x2, 8, 0])
	{
		sphere_type_1(8);
		note_type_1([16, 16, 12], [16, 16, 12]);
		translate([4, -4, 0])	text("sphere_type_1(8)", size = 1);
	}
	x3 = x2 + 16 + 4;

	// cylinder_type_1 끝이 구인 실린더
	color("pink", 1.0)
	{
		line_type_1([x3, 16, 0], [x3 + 2, 16, 32], 4, 2);
		translate([68, 16, 0])
		{
			translate([0, 0, 16])	note_type_1([8, 8, 32], [4, 4, 32], true);
			translate([-8, -12, 0])	text("line_type_1([68, 16, 0], [70, 16, 32], 4, 2)", size = 1);
		}
	}
	x4 = x3 + 32;

	//	box_type_1: 튜브형태의 네모 박스, 사방 벽면만 있는 형태
	translate([x4, 8, 0])
	{
		color("blue", 0.5)	box_type_1([8, 16, 32], 2);
		color("white", 0.5)	note_type_1([8, 16, 32]);
		translate([-4, -2, 0])	text("box_type_1([8, 16, 32], 2)", size = 1);
	}
	x5 = x4 + 24;

	//	joint_female_type_1
	translate([x5, 8, 8])
	{
		joint_female_type_1(4, [[1, 0, 0], [-1, 0, 0], [0, 1, 0], [0, -1, 0], [0, 0, 1], [1, 1, 1]]);
		color("white", 1.0)	
		note_type_1([8, 8, 8], [8, 8, 8], true);
		translate([-8, -10, 0])	text("joint_female_type_1(4, [[1, 0, 0], ...[1, 1, 1]]", size = 1);
	}
	x6 = x5 + 24;

	// cube_type_3: 벡터들을 이용하여 꼭지점을 직각으로만 연결하는 육면체
	translate([x6, 8, 8])
	{
		x = 4;
		y = 8;
		z = 16;
		r = 1;
		v = [
			[0, 0, 0],
			[x, 0, 0],
			[x, y, 0],
			[0, y, 0],
			[0, 0, z],
			[x, 0, z],
			[x, y, z],
			[0, y, z]
		];
		cube_type_3(v, r);
		color("white", 1.0)	
		translate([-r, -r, -r])	note_type_1([x, y, z] + [r * 2, r * 2, r * 2]);
		translate([0, -4, 0])	text("cube_type_3(v, 1)", size = 1);
	}
	x7 = x6 + 16;

	// ellipsis: 타원통
	translate([x7, 8, 8])
	{
		color("green", 1.0)	
		ellipsis(8, 4, 16);
		color("white", 1.0)	
		note_type_1([8, 4, 16]);
		translate([0, -4, 0])	text("ellipsis(8, 4, 16)", size = 1);
	}

// 검은색 나사못을 박을 자리를 위한 주물, ref) https://github.com/andold/resource3d/blob/main/README.md
	translate([0, 64, 0])
	{
		casting_black_25(8, true);
		translate([-4, -8, 0])	text("casting_black_25(8)", size = 1);
	}
	x11 = 16 + 4;

	//	cube_type_1
	translate([x11, 64, 0])
	{
		color("white", 1.0)	cube_type_1([16, 32, 4], 12);
		//	module note_type_2(name, vs, ve, centered = false, fs, detail = false) {
		note_type_2("note_type_2", [16, 32, 4], [12, 32, 4], false, undef, true);
	}
	x12 = x11 + 16 + 4;

	translate([x12, 64, 0])
	line_type_1([0, 0, 0], [4, 8, 12], 1);
	x13 = x12 + 24;
	
	translate([x13, 64, 0])
	{
		cube_type_4([16, 4, 8]);
		note_type_2("cube_type_4([16, 4, 8])", [16, 4, 8]);
	}
	x14 = x13 + 24;

	translate([x14, 64, 0])
	{
		cylinder_type_1(8, 4, 1);
		note_type_2("cylinder_type_1(8, 4, 1)", [8, 8, 8], [8, 8, 8], true, undef, true);
	}
	x15 = x14 + 24;

	translate([x15, 64, 0])
	{
		trimmer_type_1(4, MINIMUM, 32, 4);
		translate([-8, -4, 0])	rotate([0, 0, 0])	text("trimmer_type_1(4, MINIMUM, 32, 4)", size = 1);
	}
}
samples();
// file: ../common/constants.scad
// 상수들 정의
// include 사용하시오
MAX = [220, 220, 250];
ZERO = [0, 0, 0];
HALF = [1/2, 1/2, 1/2];
ONE = [1, 1, 1];
BIG = [1024, 1024, 1024];
EPSILON = 0.01;
EPSILON2 = EPSILON * 2;
MINIMUM = 0.1;	//	0.1mm
NOZZLE = 0.4;	//	노즐 지름
OVERHANG_THRESHOLD = 30;

FN = $preview ? 16 : 360;

//	자원들
RADIUS_HOLE_NUT_25 = 3.4 / 2;	//	검은색 25mm 나사 너트 구멍 반지름
// main file
use <MCAD/boxes.scad>

include	<../common/constants.scad>
use <../common/library.scad>
use <../common/library_cube.scad>

// 상수
EPSILLON = 0.01;
MARGIN = [4, 4, 4];
A0 = [1189, 841];
A1 = [A0.y, floor(A0.x / 2)];
A2 = [A1.y, floor(A1.x / 2)];
A3 = [A2.y, floor(A2.x / 2)];
A4 = [A3.y, floor(A3.x / 2)];
A5 = [A4.y, floor(A4.x / 2)];
A6 = [A5.y, floor(A5.x / 2)];
A7 = [A6.y, floor(A6.x / 2)];
A8 = [A7.y, floor(A7.x / 2)];
DRILL_BITS = [7.5, 15];

module basis(v, h) {
	cube([v.x, v.y, h]);
}

module drill_bits(r, h) {
	cylinder(h, r, r);
}

module build(target, step) {
	difference() {
		basis(A8, DRILL_BITS[1] + MARGIN.z);
		for (cy =[MARGIN.y + DRILL_BITS[0] / 2: DRILL_BITS[0] + MARGIN.y : A8.y - MARGIN.y - DRILL_BITS[0] / 2]) {
			for (cx =[MARGIN.x + DRILL_BITS[0] / 2: DRILL_BITS[0] + MARGIN.x : A8.x - MARGIN.x - DRILL_BITS[0] / 2]) {
				translate([cx, cy, MARGIN.z + EPSILLON]) {
					drill_bits(DRILL_BITS[0] / 2, DRILL_BITS[1]);
				}
			}
		}
	}
}

target = 7;
build(target, $t);
